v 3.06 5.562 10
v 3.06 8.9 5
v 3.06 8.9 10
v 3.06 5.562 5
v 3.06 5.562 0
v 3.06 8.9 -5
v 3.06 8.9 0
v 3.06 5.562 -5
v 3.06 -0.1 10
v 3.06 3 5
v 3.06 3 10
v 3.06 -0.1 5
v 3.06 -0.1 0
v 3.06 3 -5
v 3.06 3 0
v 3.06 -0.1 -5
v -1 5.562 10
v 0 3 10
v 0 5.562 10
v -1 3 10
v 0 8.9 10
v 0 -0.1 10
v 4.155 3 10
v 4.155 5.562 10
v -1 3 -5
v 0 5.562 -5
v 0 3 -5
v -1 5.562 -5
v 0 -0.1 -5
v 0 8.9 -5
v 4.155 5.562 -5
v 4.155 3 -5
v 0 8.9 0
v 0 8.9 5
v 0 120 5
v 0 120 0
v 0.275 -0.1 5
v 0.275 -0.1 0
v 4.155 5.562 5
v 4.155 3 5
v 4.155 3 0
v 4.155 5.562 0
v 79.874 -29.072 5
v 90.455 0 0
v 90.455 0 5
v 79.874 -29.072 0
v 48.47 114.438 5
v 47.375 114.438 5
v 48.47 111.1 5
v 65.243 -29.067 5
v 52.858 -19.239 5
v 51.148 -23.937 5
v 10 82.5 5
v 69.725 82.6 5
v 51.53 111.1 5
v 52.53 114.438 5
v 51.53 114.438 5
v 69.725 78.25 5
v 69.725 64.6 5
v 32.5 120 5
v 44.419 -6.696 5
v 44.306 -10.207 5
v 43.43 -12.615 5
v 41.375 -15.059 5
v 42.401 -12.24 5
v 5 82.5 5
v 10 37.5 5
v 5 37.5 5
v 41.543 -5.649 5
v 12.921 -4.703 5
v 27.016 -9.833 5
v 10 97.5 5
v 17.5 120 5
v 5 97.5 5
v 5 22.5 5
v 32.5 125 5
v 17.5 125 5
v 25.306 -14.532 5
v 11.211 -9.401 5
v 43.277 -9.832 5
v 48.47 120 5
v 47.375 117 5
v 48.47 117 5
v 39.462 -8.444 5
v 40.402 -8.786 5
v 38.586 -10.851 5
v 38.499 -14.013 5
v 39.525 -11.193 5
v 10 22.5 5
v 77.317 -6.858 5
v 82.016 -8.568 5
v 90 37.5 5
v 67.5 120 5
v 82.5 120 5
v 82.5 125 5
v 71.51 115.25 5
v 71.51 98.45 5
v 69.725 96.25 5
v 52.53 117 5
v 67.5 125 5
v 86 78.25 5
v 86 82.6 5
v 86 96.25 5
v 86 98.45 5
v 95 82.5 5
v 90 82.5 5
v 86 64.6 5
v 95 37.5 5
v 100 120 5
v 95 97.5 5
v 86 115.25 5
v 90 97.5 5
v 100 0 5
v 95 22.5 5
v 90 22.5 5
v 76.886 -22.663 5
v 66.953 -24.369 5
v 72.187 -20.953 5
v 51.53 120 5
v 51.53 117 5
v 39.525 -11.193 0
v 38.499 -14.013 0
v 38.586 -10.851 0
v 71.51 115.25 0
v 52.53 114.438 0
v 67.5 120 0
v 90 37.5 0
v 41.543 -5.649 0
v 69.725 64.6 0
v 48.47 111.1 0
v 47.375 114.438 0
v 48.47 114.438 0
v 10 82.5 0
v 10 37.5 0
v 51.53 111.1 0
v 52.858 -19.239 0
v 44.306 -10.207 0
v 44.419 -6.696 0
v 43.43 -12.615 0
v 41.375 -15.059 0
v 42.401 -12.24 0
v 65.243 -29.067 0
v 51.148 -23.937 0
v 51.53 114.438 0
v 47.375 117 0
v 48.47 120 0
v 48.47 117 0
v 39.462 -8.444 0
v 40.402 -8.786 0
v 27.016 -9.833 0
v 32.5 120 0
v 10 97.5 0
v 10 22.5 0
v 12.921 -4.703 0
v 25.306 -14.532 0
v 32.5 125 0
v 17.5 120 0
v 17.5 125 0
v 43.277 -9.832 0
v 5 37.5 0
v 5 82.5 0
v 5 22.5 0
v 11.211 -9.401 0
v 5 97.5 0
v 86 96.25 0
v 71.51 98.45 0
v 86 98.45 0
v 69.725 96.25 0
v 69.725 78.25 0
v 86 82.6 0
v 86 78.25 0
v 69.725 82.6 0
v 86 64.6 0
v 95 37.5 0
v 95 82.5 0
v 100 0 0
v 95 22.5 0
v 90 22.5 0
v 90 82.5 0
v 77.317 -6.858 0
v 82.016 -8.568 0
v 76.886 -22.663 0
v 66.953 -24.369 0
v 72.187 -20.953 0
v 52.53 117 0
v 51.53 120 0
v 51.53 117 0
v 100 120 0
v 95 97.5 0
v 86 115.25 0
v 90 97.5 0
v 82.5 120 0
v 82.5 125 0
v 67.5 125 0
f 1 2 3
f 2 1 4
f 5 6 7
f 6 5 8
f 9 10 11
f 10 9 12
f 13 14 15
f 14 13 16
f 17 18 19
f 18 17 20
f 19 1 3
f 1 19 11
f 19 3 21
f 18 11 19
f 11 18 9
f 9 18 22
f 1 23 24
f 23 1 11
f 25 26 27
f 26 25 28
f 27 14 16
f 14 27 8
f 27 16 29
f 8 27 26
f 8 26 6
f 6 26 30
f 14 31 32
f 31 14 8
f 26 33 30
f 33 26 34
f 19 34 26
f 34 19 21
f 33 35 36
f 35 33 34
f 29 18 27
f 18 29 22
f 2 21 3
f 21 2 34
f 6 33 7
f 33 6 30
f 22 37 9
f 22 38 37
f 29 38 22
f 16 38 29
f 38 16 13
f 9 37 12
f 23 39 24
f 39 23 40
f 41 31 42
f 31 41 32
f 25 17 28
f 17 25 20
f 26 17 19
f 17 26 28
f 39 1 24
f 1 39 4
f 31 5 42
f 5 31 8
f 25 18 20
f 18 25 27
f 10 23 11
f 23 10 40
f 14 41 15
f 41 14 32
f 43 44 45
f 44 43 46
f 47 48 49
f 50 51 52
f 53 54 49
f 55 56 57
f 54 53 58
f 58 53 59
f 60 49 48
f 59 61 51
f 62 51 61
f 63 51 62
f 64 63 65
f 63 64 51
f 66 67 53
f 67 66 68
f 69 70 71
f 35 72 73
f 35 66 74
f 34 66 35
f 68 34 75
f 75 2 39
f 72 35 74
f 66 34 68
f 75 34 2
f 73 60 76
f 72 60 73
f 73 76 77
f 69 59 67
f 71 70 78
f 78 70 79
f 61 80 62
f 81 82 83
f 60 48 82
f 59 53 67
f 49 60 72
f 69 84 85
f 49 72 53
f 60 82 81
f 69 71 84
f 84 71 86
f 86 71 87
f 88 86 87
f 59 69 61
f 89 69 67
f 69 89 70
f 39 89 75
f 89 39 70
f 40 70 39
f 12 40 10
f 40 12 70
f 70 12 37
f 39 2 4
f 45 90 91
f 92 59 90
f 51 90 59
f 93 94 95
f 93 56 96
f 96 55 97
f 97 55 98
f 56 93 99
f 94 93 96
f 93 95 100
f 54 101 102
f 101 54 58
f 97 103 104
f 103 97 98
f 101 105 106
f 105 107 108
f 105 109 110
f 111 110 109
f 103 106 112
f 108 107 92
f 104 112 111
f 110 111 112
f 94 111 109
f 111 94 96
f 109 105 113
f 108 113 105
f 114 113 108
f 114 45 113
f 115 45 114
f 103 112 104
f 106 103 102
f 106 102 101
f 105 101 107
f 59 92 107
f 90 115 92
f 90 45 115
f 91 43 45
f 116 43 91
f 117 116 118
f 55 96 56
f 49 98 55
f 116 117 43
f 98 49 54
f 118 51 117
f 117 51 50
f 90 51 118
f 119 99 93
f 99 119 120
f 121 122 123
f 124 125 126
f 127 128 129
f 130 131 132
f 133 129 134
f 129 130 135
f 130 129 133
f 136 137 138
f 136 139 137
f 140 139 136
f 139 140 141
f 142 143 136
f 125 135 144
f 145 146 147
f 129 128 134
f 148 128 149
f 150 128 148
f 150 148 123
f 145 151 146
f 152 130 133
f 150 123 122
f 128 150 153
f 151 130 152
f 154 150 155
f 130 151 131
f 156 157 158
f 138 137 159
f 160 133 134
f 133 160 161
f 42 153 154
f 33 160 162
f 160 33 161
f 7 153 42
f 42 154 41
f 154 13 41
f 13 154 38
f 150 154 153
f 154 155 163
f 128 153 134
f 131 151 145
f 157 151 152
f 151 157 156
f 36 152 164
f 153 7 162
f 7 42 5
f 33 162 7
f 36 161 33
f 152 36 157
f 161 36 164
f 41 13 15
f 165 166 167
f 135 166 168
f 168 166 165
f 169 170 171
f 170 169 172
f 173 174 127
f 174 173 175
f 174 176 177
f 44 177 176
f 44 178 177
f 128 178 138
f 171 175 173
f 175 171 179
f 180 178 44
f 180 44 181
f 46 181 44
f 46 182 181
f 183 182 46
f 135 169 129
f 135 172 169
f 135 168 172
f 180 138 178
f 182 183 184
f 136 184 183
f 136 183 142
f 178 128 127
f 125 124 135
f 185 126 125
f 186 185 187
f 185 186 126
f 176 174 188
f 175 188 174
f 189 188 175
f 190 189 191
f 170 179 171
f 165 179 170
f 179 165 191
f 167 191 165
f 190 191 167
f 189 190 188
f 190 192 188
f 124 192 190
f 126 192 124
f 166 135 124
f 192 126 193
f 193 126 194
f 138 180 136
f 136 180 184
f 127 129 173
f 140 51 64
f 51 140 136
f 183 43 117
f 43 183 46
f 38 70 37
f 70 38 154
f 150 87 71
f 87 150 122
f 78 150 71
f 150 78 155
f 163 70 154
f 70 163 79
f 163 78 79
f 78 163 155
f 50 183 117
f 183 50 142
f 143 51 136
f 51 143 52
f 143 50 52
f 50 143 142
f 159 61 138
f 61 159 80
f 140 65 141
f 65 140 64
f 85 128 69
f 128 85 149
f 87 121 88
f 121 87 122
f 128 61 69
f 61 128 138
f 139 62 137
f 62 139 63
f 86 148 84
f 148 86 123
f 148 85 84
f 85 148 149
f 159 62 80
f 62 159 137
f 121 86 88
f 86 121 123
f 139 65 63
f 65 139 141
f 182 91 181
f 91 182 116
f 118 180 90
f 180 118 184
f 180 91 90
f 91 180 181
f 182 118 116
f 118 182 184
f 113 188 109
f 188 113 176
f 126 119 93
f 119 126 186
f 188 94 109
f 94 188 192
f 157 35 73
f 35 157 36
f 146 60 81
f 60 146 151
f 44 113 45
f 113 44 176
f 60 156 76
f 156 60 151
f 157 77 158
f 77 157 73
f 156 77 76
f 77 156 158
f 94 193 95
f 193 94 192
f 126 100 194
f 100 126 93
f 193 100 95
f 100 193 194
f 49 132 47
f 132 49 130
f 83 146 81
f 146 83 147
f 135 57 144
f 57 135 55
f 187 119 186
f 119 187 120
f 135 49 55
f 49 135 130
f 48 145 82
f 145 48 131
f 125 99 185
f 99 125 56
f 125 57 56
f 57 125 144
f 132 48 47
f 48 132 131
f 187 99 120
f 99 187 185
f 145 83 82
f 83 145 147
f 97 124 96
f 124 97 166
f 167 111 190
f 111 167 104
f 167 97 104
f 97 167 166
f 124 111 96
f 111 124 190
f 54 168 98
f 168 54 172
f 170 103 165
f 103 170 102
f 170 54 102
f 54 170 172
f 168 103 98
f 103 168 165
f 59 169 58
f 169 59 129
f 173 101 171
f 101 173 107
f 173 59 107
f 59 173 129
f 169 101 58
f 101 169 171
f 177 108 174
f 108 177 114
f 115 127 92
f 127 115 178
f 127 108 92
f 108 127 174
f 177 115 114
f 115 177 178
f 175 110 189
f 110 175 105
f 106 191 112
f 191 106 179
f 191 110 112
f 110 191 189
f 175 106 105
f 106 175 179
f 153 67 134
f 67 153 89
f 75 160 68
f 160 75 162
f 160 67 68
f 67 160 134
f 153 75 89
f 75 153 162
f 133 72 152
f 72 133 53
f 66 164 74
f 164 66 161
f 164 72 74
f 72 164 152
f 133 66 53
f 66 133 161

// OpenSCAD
// file: m3_captive_nut_slot.scad
$fn = 64;

include <dimensions.scad>;

module m3_captive_nut_slot() {
    translate([0, -0.1, -panel_thickness]) {
        cube([
            m3_bolt_slot_dia,
            m3_bolt_slot_len,
            panel_thickness * 3
        ]);
    }
    translate([-1, m3_bolt_slot_len / 3, -panel_thickness])
        cube([
            m3_nut_slot_width,
            m3_nut_slot_depth, 
            panel_thickness * 3
        ]);
}


m3_captive_nut_slot();
// file: dimensions.scad
panel_thickness = 5;

bezel_width = 140;
bezel_height = 85;
bezel_corner_radius = 3;
bezel_screw_hole_dia = 3.5;
bezel_angle = 70; // degrees

tab_tolerance_coeff = 1.025;
tab_width = 15;

floor_width = bezel_width - (panel_thickness * 4);
floor_depth = 120;
floor_height_above_bottom = 10; 

sma_bulkhead_radius = 3.25;
sma_bulkhead_flat_radius = 3;

roof_width = 100;
roof_depth = 80;
roof_height_below_top = 5; 

side_height = 100;
side_depth  = floor_depth;
side_corner_radius = 1.5;
chin_depth = 42;


// Pi standoff holes
// All measurements taken from https://www.raspberrypi.org/documentation/hardware/raspberrypi/mechanical/rpi_MECH_3bplus.pdf
// Top left etc relative to drawing
// 0,0 of drawing is bottom left corner

pi_width = 85;
pi_depth = 56;
pi_hole_dia = 2.75;
pi_hole_radius = pi_hole_dia / 2;
standoff_dia = pi_hole_dia * 2;
standoff_radius = standoff_dia / 2;
standoff_height = 3;
pi_standoff_holes = [
    [3.5, 3.5],           // bottom left
    [3.5+58, 3.5],      // bottom right
    [3.5, 3.5+49],      // top left
    [3.5+58, 3.5+49], // top right
];


m3_bolt_thread_len = 8;
m3_bolt_dia = 3;
m3_bolt_clearance_coeff = 1.02;
m3_bolt_slot_dia = m3_bolt_dia * m3_bolt_clearance_coeff;
m3_bolt_slot_len = m3_bolt_thread_len + 1;
m3_nut_flats_dia = 5.5;
m3_nut_clearance_coeff = 1.025;
m3_nut_points_dia = 6;
m3_nut_depth = 2.5;
m3_nut_slot_width = ((m3_nut_flats_dia * m3_nut_clearance_coeff) - m3_bolt_slot_dia) * 2;
m3_nut_slot_depth = m3_nut_depth * m3_nut_clearance_coeff;
   
// main file
$fn = 64;

include <dimensions.scad>;
include <m3_captive_nut_slot.scad>;

module pi_usb_and_ethernet() {
    // Ethernet
    translate([0,11.5-16/2,0]) scale([1.05, 1.05, 1.05]) cube([21,16,13.8]);

    // USB
    translate([0, 29-13/2,0]) scale([1.05, 1.05, 1.05]) cube([17,13,15.5]);
    translate([0, 47-13/2,0]) scale([1.05, 1.05, 1.05]) cube([17,13,15.5]);
}

module enclosure_side(pi_cutouts=true) {
    difference() {
        union() {
            cube([side_height, side_depth, panel_thickness]);
            rotate([0, 0, -(90-bezel_angle)]) {
                difference() {
                    union() {
                        // Angled part for front panel
                        cube([bezel_height, chin_depth, panel_thickness]);
                        // Retention tabs
                        translate([(bezel_height/4)-(tab_width/2), -panel_thickness, 0]) 
                            cube([tab_width, panel_thickness, panel_thickness]);
                        translate([((bezel_height/4)*3)-(tab_width/2), -panel_thickness, 0]) 
                            cube([tab_width, panel_thickness, panel_thickness]);
                    }
                    
                    // Front panel captive nut slot
                    translate([(bezel_height/2)-(m3_bolt_slot_dia/2), 0, 0]) m3_captive_nut_slot();
                    
                    // Tab slot for "chin" panel
                    translate([bezel_height-(panel_thickness*2), panel_thickness, -panel_thickness]) 
                        cube([panel_thickness, tab_width, panel_thickness*3]);
                }
            }
            
            // Rear panel retention tabs
            translate([(side_height/4)-(tab_width/2), side_depth, 0]) 
                cube([tab_width, panel_thickness, panel_thickness]);
            translate([((side_height/4)*3)-(tab_width/2), side_depth, 0]) 
                cube([tab_width, panel_thickness, panel_thickness]);

        }
        
        // Captive nut slot
        translate([(side_height/2)+(m3_bolt_slot_dia/2), side_depth, 0])
            rotate([0, 0, 180])
                m3_captive_nut_slot();
        
        // Floor retention slots
        translate([(side_height-floor_height_above_bottom), (side_depth/4)-(tab_width/2), -panel_thickness])
            cube([panel_thickness, tab_width, panel_thickness*3]);
        translate([(side_height-floor_height_above_bottom), ((side_depth/4)*3)-(tab_width/2), -panel_thickness])
            cube([panel_thickness, tab_width, panel_thickness*3]);

        // Roof retention slots
        translate([(roof_height_below_top), (side_depth/4)-(tab_width/2), -panel_thickness])
            cube([panel_thickness, tab_width, panel_thickness*3]);
        translate([(roof_height_below_top), ((side_depth/4)*3)-(tab_width/2), -panel_thickness])
            cube([panel_thickness, tab_width, panel_thickness*3]);

        if (pi_cutouts) {
            // XXX: Do a better job than magic numbers here
            translate([86, 118.75, panel_thickness*3]) 
                rotate([180, 90, 0]) 
                    pi_usb_and_ethernet();
        }
    }
}

enclosure_side(true);
